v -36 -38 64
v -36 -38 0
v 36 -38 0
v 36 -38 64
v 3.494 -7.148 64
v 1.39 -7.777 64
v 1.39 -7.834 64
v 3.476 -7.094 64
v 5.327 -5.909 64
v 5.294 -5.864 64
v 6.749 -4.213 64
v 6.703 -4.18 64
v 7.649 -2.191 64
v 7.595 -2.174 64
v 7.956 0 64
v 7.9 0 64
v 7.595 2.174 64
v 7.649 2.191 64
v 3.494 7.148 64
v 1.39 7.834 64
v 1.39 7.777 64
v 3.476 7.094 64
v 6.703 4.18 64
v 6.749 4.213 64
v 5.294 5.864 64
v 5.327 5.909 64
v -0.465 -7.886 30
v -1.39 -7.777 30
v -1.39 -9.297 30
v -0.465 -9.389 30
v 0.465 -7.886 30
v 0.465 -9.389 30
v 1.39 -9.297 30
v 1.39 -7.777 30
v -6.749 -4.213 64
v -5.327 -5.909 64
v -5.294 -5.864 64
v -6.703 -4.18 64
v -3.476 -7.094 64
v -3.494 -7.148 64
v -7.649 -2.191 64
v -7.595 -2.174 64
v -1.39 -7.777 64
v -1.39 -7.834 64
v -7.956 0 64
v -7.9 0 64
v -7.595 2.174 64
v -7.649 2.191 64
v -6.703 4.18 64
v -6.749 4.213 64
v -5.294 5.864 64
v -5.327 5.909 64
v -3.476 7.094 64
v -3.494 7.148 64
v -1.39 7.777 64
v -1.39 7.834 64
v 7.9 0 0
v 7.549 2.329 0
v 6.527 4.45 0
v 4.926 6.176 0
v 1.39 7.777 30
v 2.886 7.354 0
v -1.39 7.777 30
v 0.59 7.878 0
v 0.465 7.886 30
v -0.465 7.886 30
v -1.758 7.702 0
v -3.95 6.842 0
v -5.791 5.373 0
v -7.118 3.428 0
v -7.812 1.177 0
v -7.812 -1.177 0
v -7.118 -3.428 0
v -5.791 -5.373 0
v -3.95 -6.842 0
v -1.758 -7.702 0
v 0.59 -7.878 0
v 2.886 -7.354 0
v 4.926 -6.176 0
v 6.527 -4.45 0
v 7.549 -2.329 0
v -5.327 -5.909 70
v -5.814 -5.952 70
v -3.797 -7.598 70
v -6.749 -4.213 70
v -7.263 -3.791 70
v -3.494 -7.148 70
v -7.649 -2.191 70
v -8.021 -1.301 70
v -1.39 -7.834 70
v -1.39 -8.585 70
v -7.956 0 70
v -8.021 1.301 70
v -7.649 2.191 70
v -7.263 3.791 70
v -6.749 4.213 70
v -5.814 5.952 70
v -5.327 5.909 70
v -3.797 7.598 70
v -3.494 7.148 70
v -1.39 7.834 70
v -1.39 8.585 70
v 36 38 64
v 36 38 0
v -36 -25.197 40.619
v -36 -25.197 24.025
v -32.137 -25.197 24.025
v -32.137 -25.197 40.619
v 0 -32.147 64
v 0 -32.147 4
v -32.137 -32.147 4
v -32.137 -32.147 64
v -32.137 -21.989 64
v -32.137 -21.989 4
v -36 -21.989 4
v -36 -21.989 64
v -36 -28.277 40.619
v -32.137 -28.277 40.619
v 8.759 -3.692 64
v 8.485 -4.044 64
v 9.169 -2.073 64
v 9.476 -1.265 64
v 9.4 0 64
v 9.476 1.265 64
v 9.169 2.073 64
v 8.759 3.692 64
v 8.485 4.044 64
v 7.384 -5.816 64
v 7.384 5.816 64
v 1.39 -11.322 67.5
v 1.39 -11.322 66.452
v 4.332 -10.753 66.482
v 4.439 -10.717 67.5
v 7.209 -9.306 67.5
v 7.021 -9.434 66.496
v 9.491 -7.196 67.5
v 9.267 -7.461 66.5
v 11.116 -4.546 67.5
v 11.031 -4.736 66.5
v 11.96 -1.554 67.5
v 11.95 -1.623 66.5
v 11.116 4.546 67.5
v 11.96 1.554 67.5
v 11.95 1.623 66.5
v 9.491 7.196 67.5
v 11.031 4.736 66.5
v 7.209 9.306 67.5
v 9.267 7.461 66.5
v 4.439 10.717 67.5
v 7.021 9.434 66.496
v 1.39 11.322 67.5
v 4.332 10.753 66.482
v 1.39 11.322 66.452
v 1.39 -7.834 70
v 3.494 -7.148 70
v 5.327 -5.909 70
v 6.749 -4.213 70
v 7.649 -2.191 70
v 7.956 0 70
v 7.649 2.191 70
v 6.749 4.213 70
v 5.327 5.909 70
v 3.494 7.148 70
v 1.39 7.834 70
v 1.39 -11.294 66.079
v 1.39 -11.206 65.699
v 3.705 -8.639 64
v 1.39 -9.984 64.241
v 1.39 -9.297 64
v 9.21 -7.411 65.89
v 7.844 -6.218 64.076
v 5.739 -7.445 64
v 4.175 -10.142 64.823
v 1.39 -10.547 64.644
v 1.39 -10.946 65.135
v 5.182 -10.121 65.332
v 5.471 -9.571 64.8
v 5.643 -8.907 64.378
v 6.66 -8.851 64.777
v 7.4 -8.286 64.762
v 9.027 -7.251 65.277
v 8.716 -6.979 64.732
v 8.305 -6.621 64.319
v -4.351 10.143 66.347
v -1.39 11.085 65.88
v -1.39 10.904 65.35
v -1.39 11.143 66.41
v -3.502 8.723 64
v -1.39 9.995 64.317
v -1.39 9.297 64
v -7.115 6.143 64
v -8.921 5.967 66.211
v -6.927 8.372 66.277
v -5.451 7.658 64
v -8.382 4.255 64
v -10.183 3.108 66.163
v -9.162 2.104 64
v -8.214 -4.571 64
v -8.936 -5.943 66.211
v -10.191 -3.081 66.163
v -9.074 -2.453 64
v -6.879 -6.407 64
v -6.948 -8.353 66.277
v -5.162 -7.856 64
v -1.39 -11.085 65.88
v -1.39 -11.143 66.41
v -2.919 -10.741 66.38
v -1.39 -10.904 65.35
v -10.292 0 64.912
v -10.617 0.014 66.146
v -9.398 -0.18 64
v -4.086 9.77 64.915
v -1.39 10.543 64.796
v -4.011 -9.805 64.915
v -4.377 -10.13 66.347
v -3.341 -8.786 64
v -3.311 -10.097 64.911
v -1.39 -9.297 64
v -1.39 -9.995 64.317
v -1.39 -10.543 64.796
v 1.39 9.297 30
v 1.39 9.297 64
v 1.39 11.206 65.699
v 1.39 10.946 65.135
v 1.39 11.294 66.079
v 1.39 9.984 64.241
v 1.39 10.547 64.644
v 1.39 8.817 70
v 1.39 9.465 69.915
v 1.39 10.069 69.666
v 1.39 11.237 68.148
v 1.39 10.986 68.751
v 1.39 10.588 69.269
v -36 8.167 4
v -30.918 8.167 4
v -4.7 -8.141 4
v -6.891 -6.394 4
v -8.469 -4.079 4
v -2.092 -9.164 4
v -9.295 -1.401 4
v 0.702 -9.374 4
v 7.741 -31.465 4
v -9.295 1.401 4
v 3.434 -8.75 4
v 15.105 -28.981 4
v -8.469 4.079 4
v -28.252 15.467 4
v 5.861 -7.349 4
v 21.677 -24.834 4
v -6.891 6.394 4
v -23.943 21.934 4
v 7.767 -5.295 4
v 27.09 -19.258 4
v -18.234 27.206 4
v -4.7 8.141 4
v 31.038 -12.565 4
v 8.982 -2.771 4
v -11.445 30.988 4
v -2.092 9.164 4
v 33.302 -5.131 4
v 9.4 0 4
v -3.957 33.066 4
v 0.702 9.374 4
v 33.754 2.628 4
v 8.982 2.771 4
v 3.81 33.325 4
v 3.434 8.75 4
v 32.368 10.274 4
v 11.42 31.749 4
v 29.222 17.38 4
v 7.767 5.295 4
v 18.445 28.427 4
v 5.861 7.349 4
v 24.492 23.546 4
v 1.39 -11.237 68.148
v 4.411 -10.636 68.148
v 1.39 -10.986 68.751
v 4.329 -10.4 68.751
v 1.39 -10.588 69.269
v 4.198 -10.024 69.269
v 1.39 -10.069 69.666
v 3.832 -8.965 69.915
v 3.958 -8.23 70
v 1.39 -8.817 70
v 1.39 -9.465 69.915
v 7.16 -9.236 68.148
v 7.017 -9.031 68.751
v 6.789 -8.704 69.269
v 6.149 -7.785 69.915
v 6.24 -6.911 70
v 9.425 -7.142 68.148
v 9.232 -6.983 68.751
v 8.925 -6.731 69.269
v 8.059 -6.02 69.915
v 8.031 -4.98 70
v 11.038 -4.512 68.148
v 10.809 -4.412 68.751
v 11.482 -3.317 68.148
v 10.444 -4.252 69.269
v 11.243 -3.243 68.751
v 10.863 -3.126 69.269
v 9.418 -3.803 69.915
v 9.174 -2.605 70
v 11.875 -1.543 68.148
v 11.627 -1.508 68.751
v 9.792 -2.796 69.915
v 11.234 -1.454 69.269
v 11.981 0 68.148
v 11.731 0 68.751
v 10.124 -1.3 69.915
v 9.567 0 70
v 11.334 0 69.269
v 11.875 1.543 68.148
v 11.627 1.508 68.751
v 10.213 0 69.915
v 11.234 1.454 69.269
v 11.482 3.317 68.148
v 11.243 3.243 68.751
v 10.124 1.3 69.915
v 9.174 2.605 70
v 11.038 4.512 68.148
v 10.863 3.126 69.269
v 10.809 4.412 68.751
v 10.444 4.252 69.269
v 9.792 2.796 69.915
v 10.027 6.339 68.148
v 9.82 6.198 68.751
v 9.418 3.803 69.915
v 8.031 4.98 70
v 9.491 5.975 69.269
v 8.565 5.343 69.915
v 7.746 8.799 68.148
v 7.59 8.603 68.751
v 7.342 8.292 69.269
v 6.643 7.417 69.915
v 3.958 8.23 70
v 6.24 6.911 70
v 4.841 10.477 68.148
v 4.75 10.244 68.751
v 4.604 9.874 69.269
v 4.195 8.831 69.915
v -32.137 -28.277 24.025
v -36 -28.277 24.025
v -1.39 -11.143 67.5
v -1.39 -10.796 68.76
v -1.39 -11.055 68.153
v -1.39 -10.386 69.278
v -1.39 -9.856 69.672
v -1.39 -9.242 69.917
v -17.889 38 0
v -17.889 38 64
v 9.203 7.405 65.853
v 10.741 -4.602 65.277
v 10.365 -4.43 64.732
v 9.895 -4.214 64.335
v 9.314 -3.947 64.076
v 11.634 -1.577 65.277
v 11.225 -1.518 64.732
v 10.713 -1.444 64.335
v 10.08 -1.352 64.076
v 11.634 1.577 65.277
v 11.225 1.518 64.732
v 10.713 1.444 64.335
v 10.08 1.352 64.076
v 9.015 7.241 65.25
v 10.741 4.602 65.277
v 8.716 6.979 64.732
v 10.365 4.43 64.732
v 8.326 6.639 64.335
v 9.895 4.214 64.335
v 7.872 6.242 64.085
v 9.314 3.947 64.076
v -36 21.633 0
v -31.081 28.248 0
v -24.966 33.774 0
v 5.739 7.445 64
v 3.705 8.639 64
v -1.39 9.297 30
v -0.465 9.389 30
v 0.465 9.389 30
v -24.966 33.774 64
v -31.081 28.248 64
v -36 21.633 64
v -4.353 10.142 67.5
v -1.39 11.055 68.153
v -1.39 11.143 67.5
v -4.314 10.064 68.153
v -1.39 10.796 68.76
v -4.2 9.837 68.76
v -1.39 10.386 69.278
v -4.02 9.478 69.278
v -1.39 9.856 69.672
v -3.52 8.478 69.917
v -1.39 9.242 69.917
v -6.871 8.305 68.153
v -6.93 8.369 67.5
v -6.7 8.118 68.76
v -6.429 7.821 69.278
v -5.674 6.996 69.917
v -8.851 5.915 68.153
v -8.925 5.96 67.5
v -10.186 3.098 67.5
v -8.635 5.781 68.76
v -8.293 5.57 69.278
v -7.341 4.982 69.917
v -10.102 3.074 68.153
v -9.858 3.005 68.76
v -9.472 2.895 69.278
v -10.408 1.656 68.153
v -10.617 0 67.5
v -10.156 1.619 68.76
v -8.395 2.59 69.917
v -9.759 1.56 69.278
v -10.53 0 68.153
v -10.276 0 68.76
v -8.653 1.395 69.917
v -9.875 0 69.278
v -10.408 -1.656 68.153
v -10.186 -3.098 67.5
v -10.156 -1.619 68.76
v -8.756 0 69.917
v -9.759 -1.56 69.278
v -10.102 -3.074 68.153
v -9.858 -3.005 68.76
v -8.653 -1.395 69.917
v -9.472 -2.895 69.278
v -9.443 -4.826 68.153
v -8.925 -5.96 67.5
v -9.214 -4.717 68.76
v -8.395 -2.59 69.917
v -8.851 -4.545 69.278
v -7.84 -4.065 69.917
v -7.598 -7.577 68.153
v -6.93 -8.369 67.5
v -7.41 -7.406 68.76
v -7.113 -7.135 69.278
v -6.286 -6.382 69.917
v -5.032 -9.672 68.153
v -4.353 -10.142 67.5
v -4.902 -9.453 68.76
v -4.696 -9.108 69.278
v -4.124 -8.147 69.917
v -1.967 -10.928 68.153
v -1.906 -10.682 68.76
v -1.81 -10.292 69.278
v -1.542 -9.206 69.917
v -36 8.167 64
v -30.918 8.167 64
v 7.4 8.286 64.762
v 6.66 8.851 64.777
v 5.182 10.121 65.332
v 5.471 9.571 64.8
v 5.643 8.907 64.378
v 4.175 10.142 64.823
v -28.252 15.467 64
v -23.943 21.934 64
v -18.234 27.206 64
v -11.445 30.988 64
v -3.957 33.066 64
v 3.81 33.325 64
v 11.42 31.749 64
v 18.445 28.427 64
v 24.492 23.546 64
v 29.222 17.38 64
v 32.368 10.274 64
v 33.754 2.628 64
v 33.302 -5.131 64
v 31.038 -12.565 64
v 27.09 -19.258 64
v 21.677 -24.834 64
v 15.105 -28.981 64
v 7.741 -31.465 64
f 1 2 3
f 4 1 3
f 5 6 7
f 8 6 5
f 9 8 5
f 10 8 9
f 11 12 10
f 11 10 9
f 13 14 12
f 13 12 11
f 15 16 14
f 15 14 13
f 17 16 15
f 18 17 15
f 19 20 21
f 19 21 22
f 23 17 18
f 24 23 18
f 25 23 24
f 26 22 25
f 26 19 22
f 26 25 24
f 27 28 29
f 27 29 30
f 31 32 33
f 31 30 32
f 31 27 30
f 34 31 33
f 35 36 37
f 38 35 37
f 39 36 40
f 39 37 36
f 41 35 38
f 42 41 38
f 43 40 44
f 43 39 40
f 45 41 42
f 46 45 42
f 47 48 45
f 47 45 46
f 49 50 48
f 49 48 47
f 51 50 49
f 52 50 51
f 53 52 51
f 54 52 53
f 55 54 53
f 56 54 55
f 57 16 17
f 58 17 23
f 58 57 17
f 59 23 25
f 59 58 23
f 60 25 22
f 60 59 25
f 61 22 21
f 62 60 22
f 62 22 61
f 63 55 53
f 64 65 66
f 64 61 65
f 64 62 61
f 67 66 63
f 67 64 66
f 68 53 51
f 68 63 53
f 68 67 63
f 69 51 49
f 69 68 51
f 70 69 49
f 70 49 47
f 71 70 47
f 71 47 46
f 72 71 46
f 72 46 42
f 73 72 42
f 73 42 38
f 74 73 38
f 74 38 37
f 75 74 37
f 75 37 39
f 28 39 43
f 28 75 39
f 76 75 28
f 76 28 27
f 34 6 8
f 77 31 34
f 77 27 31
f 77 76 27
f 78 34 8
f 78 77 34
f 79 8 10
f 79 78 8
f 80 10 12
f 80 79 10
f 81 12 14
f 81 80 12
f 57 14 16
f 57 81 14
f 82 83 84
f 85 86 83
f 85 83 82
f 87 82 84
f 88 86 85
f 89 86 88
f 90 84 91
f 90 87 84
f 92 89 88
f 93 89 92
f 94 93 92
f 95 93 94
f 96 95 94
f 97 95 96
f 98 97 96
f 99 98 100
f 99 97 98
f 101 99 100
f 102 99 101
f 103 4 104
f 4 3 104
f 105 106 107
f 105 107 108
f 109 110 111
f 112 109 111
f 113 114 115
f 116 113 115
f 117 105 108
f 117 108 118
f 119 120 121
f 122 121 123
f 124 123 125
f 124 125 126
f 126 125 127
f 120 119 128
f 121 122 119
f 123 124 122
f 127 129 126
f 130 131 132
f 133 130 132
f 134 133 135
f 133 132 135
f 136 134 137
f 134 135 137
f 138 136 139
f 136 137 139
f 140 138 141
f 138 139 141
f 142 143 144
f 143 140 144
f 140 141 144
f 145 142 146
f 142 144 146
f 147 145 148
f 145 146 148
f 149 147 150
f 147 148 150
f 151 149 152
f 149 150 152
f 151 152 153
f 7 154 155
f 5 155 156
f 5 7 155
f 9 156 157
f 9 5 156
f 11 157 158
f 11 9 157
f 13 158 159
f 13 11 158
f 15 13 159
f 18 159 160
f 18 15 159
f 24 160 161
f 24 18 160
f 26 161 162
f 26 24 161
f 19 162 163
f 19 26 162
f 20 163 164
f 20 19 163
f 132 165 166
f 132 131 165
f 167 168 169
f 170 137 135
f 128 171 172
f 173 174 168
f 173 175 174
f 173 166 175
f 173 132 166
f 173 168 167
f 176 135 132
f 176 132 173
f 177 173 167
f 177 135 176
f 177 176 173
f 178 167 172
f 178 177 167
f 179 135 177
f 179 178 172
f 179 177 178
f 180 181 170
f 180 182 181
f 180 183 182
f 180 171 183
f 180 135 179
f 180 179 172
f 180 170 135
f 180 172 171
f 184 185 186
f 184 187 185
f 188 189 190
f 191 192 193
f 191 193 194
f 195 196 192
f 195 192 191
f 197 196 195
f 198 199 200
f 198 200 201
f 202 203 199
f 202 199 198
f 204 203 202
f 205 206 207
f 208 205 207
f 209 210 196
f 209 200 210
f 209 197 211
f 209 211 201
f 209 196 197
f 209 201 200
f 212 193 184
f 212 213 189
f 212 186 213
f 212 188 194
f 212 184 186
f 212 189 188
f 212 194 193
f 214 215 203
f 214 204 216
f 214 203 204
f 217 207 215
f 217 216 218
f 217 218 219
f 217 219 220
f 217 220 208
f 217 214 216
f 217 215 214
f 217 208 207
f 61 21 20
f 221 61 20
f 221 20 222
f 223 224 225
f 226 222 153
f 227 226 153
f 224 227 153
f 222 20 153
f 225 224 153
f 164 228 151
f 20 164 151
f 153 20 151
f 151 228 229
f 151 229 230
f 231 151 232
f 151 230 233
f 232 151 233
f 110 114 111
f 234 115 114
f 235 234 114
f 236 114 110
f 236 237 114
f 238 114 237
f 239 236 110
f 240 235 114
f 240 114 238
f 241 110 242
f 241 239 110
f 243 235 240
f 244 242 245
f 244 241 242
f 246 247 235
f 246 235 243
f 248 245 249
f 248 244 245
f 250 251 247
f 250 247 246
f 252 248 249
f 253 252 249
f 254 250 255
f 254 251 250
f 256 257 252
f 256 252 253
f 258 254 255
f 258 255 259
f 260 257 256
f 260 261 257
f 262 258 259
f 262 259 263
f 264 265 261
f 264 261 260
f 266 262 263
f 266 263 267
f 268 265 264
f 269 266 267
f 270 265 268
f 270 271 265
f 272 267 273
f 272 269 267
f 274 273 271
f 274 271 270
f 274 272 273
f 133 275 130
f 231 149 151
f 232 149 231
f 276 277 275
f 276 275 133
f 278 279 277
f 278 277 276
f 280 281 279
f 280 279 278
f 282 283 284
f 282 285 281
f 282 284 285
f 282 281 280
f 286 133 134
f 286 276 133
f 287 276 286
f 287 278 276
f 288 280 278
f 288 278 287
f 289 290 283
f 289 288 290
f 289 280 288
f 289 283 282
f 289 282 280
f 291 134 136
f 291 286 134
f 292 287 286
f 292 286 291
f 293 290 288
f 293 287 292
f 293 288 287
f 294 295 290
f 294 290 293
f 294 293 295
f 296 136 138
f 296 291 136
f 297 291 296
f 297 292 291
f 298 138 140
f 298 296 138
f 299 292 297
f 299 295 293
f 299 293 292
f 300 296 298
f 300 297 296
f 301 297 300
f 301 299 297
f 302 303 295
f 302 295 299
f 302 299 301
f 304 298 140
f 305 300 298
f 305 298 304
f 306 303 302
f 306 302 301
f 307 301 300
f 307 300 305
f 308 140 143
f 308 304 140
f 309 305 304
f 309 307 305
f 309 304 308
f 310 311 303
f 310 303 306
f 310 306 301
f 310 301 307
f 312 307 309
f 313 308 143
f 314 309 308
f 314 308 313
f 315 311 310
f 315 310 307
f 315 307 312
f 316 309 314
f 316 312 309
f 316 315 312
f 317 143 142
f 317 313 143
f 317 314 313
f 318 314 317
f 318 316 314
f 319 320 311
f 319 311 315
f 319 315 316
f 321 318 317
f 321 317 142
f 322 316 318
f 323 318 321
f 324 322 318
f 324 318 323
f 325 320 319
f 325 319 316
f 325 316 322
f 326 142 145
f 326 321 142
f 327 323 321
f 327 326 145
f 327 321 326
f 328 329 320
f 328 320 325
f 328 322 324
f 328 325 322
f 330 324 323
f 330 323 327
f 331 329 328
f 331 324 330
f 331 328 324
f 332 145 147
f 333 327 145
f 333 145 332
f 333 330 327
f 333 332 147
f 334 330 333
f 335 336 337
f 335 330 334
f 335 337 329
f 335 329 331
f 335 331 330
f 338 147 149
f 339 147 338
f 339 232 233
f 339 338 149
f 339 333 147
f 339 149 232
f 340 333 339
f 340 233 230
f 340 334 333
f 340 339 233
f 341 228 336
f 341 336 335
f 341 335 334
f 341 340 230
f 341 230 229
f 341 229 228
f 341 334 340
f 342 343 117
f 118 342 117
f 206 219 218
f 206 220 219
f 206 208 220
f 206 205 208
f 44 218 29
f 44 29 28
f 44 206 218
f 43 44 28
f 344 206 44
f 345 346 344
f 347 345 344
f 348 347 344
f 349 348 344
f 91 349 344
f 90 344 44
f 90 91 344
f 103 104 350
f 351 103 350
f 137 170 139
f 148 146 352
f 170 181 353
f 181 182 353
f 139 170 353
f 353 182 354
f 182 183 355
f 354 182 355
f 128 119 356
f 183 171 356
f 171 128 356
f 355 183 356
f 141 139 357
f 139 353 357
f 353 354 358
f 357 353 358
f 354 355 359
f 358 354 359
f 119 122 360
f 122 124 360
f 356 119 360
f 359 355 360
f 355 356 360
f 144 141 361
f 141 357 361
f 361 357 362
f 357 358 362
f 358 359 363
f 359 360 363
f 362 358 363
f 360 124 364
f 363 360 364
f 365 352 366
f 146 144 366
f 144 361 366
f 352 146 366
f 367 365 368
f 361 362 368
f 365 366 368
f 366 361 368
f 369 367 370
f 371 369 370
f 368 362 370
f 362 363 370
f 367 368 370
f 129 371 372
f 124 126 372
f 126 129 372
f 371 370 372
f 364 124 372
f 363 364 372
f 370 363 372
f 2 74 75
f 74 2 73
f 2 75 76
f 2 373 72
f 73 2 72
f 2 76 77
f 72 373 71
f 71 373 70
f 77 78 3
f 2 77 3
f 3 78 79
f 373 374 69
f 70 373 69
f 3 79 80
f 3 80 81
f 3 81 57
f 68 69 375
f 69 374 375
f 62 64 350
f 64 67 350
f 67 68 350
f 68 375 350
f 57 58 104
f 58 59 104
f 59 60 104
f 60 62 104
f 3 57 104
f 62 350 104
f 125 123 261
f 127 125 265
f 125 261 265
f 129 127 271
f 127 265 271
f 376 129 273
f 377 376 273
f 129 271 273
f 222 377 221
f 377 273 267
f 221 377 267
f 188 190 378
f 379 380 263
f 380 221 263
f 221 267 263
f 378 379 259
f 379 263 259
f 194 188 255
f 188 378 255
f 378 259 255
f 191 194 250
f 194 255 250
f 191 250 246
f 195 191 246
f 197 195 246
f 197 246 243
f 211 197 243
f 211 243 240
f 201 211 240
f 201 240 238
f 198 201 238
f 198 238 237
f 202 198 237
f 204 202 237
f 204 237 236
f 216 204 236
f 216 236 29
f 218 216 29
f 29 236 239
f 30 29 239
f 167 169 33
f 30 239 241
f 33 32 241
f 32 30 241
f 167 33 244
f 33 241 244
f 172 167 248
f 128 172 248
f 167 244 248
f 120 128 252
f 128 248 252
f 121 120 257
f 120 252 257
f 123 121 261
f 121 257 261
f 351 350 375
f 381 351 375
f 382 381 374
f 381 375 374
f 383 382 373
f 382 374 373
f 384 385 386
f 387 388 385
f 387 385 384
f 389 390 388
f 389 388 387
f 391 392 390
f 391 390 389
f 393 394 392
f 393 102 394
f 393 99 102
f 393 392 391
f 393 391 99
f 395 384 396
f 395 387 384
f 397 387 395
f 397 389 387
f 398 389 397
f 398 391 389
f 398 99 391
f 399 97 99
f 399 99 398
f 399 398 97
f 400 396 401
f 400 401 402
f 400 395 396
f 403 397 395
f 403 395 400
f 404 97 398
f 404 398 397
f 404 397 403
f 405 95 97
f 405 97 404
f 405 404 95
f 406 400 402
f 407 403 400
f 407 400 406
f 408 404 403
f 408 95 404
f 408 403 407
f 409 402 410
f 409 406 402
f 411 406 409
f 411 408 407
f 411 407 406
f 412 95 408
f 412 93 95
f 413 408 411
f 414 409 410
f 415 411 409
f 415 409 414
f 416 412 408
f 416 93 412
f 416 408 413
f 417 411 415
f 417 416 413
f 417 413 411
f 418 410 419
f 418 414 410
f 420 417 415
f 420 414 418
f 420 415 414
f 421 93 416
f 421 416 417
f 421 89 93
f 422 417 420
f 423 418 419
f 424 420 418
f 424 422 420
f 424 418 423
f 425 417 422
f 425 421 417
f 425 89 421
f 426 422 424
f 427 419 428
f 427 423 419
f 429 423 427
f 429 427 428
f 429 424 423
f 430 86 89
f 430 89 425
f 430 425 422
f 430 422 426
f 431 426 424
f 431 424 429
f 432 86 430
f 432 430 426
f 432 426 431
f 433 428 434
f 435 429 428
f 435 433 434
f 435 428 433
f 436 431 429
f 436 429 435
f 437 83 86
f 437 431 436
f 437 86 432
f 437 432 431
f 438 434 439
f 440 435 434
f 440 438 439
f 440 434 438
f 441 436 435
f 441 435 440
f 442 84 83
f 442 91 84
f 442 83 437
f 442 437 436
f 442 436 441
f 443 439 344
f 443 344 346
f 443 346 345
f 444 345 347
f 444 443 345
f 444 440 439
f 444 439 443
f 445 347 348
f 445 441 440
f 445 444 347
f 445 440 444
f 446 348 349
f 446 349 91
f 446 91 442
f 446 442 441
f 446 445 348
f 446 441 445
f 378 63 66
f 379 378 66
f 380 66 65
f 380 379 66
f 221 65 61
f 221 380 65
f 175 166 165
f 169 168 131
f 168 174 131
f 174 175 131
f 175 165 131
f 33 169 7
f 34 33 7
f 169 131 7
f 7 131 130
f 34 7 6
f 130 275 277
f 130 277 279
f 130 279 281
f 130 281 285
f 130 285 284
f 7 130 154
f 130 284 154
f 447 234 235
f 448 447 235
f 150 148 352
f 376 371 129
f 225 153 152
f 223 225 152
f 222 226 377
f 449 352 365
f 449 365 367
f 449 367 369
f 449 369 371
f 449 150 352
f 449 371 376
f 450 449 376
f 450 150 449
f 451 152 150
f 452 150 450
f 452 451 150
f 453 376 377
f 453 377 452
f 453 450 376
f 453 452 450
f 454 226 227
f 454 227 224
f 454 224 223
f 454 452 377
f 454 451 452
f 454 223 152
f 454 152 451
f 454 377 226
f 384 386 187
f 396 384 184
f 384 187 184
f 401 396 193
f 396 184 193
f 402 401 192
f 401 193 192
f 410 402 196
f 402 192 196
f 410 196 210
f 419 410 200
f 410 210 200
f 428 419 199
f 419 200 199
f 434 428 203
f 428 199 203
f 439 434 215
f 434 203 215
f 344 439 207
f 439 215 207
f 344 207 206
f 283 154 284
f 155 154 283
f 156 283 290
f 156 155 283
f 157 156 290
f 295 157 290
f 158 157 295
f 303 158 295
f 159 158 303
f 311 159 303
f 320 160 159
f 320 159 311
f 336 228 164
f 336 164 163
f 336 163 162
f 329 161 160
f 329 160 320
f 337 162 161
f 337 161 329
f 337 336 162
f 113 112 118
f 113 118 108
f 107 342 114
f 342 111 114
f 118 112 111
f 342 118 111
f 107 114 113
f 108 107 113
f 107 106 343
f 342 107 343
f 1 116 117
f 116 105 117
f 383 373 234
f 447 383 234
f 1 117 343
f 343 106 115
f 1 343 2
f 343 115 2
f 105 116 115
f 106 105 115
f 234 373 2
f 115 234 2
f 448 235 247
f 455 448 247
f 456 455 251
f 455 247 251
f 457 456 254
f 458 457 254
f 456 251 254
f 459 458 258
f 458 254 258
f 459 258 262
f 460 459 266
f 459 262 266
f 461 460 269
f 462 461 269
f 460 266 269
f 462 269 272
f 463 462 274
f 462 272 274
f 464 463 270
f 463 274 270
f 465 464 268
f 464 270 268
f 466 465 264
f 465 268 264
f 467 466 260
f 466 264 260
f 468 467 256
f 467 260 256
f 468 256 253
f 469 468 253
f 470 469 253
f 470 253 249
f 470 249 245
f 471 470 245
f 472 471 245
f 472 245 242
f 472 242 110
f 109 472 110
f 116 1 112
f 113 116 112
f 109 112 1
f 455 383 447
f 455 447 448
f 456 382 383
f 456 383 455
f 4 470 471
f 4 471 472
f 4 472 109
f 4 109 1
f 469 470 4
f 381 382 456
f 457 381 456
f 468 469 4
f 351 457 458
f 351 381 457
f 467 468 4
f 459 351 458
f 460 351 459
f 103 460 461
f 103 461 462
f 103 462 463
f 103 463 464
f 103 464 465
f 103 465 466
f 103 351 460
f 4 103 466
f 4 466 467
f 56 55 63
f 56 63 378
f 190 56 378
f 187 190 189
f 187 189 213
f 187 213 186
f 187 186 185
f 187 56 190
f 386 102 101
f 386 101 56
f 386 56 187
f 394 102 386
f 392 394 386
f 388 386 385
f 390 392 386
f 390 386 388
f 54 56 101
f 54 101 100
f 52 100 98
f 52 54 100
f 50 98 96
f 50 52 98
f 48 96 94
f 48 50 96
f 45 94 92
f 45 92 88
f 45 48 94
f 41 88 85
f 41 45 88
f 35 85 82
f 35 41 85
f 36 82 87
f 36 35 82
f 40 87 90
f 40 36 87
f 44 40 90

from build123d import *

# Parameters (mm, degrees)
F0_R      = 7.9
F1_DEPTH  = 4
F2_R      = 9.4
F2_R_2    = 7.9
F3_DEPTH  = 60
F4_W      = 3.080128
F4_H      = 16.594132
F5_DEPTH  = 25
F6_R      = 11.341969
F6_R_2    = 7.956315
F7_DEPTH  = 6
F8_R      = 2.5
F9_W      = 2.779254
F9_H      = 27.416152
F10_DEPTH = 40


with BuildPart() as f1:
    # F0 (on Top) → F1 (new body)
    with BuildSketch(Plane.XY):
        with BuildLine():
            Line((36, 38), (-17.888544, 38))
            ThreePointArc((-17.888544, 38), (-28.159562, 31.1615), (-36, 21.633308))
            Line((-36, 21.633308), (-36, -38))
            Line((-36, -38), (36, -38))
            Line((36, -38), (36, 38))
        make_face()
        Circle(F0_R, mode=Mode.SUBTRACT)
    extrude(amount=F1_DEPTH)

    # F2 (on face) → F3 (join)
    with BuildSketch(Plane.XY.offset(4)):
        Circle(F2_R)
        Circle(F2_R_2, mode=Mode.SUBTRACT)
        with BuildLine():
            Line((36, 38), (-17.888544, 38))
            ThreePointArc((-17.888544, 38), (-28.159562, 31.1615), (-36, 21.633308))
            Line((-36, 21.633308), (-36, 8.167186))
            Line((-36, 8.167186), (-30.917966, 8.167186))
            ThreePointArc((-30.917966, 8.167186), (27.040261, 20.60372), (0, -32.147087))
            Line((0, -32.147087), (-32.136563, -32.147087))
            Line((-32.136563, -32.147087), (-32.136563, -29.065894))
            Line((-32.136563, -29.065894), (-32.136563, -21.989353))
            Line((-32.136563, -21.989353), (-36, -21.989353))
            Line((-36, -21.989353), (-36, -29.065894))
            Line((-36, -29.065894), (-36, -38))
            Line((-36, -38), (36, -38))
            Line((36, -38), (36, 38))
        make_face()
    extrude(amount=F3_DEPTH)

    # F4 (on face) → F5 (cut)
    with BuildSketch(Plane(origin=(-36, 0, 0), x_dir=(0, -1, 0), z_dir=(-1, 0, 0))):
        with Locations((26.73703, 32.321629)):
            Rectangle(F4_W, F4_H)
    extrude(amount=-F5_DEPTH, mode=Mode.SUBTRACT)

    # F6 (on face) → F7 (join)
    with BuildSketch(Plane.XY.offset(64)):
        with Locations((0.724832, 0)):
            Circle(F6_R)
        Circle(F6_R_2, mode=Mode.SUBTRACT)
    extrude(amount=F7_DEPTH)

    # F8
    f8_edges = [f1.edges().sort_by_distance(p)[0] for p in [
        (-10.617137, 0, 70),
        (-10.617137, 0, 64),
    ]]
    fillet(f8_edges, radius=F8_R)

    # F9 (on face) → F10 (cut)
    with BuildSketch(Plane.XY.offset(70)):
        Rectangle(F9_W, F9_H)
    extrude(amount=-F10_DEPTH, mode=Mode.SUBTRACT)


solid = f1.part
